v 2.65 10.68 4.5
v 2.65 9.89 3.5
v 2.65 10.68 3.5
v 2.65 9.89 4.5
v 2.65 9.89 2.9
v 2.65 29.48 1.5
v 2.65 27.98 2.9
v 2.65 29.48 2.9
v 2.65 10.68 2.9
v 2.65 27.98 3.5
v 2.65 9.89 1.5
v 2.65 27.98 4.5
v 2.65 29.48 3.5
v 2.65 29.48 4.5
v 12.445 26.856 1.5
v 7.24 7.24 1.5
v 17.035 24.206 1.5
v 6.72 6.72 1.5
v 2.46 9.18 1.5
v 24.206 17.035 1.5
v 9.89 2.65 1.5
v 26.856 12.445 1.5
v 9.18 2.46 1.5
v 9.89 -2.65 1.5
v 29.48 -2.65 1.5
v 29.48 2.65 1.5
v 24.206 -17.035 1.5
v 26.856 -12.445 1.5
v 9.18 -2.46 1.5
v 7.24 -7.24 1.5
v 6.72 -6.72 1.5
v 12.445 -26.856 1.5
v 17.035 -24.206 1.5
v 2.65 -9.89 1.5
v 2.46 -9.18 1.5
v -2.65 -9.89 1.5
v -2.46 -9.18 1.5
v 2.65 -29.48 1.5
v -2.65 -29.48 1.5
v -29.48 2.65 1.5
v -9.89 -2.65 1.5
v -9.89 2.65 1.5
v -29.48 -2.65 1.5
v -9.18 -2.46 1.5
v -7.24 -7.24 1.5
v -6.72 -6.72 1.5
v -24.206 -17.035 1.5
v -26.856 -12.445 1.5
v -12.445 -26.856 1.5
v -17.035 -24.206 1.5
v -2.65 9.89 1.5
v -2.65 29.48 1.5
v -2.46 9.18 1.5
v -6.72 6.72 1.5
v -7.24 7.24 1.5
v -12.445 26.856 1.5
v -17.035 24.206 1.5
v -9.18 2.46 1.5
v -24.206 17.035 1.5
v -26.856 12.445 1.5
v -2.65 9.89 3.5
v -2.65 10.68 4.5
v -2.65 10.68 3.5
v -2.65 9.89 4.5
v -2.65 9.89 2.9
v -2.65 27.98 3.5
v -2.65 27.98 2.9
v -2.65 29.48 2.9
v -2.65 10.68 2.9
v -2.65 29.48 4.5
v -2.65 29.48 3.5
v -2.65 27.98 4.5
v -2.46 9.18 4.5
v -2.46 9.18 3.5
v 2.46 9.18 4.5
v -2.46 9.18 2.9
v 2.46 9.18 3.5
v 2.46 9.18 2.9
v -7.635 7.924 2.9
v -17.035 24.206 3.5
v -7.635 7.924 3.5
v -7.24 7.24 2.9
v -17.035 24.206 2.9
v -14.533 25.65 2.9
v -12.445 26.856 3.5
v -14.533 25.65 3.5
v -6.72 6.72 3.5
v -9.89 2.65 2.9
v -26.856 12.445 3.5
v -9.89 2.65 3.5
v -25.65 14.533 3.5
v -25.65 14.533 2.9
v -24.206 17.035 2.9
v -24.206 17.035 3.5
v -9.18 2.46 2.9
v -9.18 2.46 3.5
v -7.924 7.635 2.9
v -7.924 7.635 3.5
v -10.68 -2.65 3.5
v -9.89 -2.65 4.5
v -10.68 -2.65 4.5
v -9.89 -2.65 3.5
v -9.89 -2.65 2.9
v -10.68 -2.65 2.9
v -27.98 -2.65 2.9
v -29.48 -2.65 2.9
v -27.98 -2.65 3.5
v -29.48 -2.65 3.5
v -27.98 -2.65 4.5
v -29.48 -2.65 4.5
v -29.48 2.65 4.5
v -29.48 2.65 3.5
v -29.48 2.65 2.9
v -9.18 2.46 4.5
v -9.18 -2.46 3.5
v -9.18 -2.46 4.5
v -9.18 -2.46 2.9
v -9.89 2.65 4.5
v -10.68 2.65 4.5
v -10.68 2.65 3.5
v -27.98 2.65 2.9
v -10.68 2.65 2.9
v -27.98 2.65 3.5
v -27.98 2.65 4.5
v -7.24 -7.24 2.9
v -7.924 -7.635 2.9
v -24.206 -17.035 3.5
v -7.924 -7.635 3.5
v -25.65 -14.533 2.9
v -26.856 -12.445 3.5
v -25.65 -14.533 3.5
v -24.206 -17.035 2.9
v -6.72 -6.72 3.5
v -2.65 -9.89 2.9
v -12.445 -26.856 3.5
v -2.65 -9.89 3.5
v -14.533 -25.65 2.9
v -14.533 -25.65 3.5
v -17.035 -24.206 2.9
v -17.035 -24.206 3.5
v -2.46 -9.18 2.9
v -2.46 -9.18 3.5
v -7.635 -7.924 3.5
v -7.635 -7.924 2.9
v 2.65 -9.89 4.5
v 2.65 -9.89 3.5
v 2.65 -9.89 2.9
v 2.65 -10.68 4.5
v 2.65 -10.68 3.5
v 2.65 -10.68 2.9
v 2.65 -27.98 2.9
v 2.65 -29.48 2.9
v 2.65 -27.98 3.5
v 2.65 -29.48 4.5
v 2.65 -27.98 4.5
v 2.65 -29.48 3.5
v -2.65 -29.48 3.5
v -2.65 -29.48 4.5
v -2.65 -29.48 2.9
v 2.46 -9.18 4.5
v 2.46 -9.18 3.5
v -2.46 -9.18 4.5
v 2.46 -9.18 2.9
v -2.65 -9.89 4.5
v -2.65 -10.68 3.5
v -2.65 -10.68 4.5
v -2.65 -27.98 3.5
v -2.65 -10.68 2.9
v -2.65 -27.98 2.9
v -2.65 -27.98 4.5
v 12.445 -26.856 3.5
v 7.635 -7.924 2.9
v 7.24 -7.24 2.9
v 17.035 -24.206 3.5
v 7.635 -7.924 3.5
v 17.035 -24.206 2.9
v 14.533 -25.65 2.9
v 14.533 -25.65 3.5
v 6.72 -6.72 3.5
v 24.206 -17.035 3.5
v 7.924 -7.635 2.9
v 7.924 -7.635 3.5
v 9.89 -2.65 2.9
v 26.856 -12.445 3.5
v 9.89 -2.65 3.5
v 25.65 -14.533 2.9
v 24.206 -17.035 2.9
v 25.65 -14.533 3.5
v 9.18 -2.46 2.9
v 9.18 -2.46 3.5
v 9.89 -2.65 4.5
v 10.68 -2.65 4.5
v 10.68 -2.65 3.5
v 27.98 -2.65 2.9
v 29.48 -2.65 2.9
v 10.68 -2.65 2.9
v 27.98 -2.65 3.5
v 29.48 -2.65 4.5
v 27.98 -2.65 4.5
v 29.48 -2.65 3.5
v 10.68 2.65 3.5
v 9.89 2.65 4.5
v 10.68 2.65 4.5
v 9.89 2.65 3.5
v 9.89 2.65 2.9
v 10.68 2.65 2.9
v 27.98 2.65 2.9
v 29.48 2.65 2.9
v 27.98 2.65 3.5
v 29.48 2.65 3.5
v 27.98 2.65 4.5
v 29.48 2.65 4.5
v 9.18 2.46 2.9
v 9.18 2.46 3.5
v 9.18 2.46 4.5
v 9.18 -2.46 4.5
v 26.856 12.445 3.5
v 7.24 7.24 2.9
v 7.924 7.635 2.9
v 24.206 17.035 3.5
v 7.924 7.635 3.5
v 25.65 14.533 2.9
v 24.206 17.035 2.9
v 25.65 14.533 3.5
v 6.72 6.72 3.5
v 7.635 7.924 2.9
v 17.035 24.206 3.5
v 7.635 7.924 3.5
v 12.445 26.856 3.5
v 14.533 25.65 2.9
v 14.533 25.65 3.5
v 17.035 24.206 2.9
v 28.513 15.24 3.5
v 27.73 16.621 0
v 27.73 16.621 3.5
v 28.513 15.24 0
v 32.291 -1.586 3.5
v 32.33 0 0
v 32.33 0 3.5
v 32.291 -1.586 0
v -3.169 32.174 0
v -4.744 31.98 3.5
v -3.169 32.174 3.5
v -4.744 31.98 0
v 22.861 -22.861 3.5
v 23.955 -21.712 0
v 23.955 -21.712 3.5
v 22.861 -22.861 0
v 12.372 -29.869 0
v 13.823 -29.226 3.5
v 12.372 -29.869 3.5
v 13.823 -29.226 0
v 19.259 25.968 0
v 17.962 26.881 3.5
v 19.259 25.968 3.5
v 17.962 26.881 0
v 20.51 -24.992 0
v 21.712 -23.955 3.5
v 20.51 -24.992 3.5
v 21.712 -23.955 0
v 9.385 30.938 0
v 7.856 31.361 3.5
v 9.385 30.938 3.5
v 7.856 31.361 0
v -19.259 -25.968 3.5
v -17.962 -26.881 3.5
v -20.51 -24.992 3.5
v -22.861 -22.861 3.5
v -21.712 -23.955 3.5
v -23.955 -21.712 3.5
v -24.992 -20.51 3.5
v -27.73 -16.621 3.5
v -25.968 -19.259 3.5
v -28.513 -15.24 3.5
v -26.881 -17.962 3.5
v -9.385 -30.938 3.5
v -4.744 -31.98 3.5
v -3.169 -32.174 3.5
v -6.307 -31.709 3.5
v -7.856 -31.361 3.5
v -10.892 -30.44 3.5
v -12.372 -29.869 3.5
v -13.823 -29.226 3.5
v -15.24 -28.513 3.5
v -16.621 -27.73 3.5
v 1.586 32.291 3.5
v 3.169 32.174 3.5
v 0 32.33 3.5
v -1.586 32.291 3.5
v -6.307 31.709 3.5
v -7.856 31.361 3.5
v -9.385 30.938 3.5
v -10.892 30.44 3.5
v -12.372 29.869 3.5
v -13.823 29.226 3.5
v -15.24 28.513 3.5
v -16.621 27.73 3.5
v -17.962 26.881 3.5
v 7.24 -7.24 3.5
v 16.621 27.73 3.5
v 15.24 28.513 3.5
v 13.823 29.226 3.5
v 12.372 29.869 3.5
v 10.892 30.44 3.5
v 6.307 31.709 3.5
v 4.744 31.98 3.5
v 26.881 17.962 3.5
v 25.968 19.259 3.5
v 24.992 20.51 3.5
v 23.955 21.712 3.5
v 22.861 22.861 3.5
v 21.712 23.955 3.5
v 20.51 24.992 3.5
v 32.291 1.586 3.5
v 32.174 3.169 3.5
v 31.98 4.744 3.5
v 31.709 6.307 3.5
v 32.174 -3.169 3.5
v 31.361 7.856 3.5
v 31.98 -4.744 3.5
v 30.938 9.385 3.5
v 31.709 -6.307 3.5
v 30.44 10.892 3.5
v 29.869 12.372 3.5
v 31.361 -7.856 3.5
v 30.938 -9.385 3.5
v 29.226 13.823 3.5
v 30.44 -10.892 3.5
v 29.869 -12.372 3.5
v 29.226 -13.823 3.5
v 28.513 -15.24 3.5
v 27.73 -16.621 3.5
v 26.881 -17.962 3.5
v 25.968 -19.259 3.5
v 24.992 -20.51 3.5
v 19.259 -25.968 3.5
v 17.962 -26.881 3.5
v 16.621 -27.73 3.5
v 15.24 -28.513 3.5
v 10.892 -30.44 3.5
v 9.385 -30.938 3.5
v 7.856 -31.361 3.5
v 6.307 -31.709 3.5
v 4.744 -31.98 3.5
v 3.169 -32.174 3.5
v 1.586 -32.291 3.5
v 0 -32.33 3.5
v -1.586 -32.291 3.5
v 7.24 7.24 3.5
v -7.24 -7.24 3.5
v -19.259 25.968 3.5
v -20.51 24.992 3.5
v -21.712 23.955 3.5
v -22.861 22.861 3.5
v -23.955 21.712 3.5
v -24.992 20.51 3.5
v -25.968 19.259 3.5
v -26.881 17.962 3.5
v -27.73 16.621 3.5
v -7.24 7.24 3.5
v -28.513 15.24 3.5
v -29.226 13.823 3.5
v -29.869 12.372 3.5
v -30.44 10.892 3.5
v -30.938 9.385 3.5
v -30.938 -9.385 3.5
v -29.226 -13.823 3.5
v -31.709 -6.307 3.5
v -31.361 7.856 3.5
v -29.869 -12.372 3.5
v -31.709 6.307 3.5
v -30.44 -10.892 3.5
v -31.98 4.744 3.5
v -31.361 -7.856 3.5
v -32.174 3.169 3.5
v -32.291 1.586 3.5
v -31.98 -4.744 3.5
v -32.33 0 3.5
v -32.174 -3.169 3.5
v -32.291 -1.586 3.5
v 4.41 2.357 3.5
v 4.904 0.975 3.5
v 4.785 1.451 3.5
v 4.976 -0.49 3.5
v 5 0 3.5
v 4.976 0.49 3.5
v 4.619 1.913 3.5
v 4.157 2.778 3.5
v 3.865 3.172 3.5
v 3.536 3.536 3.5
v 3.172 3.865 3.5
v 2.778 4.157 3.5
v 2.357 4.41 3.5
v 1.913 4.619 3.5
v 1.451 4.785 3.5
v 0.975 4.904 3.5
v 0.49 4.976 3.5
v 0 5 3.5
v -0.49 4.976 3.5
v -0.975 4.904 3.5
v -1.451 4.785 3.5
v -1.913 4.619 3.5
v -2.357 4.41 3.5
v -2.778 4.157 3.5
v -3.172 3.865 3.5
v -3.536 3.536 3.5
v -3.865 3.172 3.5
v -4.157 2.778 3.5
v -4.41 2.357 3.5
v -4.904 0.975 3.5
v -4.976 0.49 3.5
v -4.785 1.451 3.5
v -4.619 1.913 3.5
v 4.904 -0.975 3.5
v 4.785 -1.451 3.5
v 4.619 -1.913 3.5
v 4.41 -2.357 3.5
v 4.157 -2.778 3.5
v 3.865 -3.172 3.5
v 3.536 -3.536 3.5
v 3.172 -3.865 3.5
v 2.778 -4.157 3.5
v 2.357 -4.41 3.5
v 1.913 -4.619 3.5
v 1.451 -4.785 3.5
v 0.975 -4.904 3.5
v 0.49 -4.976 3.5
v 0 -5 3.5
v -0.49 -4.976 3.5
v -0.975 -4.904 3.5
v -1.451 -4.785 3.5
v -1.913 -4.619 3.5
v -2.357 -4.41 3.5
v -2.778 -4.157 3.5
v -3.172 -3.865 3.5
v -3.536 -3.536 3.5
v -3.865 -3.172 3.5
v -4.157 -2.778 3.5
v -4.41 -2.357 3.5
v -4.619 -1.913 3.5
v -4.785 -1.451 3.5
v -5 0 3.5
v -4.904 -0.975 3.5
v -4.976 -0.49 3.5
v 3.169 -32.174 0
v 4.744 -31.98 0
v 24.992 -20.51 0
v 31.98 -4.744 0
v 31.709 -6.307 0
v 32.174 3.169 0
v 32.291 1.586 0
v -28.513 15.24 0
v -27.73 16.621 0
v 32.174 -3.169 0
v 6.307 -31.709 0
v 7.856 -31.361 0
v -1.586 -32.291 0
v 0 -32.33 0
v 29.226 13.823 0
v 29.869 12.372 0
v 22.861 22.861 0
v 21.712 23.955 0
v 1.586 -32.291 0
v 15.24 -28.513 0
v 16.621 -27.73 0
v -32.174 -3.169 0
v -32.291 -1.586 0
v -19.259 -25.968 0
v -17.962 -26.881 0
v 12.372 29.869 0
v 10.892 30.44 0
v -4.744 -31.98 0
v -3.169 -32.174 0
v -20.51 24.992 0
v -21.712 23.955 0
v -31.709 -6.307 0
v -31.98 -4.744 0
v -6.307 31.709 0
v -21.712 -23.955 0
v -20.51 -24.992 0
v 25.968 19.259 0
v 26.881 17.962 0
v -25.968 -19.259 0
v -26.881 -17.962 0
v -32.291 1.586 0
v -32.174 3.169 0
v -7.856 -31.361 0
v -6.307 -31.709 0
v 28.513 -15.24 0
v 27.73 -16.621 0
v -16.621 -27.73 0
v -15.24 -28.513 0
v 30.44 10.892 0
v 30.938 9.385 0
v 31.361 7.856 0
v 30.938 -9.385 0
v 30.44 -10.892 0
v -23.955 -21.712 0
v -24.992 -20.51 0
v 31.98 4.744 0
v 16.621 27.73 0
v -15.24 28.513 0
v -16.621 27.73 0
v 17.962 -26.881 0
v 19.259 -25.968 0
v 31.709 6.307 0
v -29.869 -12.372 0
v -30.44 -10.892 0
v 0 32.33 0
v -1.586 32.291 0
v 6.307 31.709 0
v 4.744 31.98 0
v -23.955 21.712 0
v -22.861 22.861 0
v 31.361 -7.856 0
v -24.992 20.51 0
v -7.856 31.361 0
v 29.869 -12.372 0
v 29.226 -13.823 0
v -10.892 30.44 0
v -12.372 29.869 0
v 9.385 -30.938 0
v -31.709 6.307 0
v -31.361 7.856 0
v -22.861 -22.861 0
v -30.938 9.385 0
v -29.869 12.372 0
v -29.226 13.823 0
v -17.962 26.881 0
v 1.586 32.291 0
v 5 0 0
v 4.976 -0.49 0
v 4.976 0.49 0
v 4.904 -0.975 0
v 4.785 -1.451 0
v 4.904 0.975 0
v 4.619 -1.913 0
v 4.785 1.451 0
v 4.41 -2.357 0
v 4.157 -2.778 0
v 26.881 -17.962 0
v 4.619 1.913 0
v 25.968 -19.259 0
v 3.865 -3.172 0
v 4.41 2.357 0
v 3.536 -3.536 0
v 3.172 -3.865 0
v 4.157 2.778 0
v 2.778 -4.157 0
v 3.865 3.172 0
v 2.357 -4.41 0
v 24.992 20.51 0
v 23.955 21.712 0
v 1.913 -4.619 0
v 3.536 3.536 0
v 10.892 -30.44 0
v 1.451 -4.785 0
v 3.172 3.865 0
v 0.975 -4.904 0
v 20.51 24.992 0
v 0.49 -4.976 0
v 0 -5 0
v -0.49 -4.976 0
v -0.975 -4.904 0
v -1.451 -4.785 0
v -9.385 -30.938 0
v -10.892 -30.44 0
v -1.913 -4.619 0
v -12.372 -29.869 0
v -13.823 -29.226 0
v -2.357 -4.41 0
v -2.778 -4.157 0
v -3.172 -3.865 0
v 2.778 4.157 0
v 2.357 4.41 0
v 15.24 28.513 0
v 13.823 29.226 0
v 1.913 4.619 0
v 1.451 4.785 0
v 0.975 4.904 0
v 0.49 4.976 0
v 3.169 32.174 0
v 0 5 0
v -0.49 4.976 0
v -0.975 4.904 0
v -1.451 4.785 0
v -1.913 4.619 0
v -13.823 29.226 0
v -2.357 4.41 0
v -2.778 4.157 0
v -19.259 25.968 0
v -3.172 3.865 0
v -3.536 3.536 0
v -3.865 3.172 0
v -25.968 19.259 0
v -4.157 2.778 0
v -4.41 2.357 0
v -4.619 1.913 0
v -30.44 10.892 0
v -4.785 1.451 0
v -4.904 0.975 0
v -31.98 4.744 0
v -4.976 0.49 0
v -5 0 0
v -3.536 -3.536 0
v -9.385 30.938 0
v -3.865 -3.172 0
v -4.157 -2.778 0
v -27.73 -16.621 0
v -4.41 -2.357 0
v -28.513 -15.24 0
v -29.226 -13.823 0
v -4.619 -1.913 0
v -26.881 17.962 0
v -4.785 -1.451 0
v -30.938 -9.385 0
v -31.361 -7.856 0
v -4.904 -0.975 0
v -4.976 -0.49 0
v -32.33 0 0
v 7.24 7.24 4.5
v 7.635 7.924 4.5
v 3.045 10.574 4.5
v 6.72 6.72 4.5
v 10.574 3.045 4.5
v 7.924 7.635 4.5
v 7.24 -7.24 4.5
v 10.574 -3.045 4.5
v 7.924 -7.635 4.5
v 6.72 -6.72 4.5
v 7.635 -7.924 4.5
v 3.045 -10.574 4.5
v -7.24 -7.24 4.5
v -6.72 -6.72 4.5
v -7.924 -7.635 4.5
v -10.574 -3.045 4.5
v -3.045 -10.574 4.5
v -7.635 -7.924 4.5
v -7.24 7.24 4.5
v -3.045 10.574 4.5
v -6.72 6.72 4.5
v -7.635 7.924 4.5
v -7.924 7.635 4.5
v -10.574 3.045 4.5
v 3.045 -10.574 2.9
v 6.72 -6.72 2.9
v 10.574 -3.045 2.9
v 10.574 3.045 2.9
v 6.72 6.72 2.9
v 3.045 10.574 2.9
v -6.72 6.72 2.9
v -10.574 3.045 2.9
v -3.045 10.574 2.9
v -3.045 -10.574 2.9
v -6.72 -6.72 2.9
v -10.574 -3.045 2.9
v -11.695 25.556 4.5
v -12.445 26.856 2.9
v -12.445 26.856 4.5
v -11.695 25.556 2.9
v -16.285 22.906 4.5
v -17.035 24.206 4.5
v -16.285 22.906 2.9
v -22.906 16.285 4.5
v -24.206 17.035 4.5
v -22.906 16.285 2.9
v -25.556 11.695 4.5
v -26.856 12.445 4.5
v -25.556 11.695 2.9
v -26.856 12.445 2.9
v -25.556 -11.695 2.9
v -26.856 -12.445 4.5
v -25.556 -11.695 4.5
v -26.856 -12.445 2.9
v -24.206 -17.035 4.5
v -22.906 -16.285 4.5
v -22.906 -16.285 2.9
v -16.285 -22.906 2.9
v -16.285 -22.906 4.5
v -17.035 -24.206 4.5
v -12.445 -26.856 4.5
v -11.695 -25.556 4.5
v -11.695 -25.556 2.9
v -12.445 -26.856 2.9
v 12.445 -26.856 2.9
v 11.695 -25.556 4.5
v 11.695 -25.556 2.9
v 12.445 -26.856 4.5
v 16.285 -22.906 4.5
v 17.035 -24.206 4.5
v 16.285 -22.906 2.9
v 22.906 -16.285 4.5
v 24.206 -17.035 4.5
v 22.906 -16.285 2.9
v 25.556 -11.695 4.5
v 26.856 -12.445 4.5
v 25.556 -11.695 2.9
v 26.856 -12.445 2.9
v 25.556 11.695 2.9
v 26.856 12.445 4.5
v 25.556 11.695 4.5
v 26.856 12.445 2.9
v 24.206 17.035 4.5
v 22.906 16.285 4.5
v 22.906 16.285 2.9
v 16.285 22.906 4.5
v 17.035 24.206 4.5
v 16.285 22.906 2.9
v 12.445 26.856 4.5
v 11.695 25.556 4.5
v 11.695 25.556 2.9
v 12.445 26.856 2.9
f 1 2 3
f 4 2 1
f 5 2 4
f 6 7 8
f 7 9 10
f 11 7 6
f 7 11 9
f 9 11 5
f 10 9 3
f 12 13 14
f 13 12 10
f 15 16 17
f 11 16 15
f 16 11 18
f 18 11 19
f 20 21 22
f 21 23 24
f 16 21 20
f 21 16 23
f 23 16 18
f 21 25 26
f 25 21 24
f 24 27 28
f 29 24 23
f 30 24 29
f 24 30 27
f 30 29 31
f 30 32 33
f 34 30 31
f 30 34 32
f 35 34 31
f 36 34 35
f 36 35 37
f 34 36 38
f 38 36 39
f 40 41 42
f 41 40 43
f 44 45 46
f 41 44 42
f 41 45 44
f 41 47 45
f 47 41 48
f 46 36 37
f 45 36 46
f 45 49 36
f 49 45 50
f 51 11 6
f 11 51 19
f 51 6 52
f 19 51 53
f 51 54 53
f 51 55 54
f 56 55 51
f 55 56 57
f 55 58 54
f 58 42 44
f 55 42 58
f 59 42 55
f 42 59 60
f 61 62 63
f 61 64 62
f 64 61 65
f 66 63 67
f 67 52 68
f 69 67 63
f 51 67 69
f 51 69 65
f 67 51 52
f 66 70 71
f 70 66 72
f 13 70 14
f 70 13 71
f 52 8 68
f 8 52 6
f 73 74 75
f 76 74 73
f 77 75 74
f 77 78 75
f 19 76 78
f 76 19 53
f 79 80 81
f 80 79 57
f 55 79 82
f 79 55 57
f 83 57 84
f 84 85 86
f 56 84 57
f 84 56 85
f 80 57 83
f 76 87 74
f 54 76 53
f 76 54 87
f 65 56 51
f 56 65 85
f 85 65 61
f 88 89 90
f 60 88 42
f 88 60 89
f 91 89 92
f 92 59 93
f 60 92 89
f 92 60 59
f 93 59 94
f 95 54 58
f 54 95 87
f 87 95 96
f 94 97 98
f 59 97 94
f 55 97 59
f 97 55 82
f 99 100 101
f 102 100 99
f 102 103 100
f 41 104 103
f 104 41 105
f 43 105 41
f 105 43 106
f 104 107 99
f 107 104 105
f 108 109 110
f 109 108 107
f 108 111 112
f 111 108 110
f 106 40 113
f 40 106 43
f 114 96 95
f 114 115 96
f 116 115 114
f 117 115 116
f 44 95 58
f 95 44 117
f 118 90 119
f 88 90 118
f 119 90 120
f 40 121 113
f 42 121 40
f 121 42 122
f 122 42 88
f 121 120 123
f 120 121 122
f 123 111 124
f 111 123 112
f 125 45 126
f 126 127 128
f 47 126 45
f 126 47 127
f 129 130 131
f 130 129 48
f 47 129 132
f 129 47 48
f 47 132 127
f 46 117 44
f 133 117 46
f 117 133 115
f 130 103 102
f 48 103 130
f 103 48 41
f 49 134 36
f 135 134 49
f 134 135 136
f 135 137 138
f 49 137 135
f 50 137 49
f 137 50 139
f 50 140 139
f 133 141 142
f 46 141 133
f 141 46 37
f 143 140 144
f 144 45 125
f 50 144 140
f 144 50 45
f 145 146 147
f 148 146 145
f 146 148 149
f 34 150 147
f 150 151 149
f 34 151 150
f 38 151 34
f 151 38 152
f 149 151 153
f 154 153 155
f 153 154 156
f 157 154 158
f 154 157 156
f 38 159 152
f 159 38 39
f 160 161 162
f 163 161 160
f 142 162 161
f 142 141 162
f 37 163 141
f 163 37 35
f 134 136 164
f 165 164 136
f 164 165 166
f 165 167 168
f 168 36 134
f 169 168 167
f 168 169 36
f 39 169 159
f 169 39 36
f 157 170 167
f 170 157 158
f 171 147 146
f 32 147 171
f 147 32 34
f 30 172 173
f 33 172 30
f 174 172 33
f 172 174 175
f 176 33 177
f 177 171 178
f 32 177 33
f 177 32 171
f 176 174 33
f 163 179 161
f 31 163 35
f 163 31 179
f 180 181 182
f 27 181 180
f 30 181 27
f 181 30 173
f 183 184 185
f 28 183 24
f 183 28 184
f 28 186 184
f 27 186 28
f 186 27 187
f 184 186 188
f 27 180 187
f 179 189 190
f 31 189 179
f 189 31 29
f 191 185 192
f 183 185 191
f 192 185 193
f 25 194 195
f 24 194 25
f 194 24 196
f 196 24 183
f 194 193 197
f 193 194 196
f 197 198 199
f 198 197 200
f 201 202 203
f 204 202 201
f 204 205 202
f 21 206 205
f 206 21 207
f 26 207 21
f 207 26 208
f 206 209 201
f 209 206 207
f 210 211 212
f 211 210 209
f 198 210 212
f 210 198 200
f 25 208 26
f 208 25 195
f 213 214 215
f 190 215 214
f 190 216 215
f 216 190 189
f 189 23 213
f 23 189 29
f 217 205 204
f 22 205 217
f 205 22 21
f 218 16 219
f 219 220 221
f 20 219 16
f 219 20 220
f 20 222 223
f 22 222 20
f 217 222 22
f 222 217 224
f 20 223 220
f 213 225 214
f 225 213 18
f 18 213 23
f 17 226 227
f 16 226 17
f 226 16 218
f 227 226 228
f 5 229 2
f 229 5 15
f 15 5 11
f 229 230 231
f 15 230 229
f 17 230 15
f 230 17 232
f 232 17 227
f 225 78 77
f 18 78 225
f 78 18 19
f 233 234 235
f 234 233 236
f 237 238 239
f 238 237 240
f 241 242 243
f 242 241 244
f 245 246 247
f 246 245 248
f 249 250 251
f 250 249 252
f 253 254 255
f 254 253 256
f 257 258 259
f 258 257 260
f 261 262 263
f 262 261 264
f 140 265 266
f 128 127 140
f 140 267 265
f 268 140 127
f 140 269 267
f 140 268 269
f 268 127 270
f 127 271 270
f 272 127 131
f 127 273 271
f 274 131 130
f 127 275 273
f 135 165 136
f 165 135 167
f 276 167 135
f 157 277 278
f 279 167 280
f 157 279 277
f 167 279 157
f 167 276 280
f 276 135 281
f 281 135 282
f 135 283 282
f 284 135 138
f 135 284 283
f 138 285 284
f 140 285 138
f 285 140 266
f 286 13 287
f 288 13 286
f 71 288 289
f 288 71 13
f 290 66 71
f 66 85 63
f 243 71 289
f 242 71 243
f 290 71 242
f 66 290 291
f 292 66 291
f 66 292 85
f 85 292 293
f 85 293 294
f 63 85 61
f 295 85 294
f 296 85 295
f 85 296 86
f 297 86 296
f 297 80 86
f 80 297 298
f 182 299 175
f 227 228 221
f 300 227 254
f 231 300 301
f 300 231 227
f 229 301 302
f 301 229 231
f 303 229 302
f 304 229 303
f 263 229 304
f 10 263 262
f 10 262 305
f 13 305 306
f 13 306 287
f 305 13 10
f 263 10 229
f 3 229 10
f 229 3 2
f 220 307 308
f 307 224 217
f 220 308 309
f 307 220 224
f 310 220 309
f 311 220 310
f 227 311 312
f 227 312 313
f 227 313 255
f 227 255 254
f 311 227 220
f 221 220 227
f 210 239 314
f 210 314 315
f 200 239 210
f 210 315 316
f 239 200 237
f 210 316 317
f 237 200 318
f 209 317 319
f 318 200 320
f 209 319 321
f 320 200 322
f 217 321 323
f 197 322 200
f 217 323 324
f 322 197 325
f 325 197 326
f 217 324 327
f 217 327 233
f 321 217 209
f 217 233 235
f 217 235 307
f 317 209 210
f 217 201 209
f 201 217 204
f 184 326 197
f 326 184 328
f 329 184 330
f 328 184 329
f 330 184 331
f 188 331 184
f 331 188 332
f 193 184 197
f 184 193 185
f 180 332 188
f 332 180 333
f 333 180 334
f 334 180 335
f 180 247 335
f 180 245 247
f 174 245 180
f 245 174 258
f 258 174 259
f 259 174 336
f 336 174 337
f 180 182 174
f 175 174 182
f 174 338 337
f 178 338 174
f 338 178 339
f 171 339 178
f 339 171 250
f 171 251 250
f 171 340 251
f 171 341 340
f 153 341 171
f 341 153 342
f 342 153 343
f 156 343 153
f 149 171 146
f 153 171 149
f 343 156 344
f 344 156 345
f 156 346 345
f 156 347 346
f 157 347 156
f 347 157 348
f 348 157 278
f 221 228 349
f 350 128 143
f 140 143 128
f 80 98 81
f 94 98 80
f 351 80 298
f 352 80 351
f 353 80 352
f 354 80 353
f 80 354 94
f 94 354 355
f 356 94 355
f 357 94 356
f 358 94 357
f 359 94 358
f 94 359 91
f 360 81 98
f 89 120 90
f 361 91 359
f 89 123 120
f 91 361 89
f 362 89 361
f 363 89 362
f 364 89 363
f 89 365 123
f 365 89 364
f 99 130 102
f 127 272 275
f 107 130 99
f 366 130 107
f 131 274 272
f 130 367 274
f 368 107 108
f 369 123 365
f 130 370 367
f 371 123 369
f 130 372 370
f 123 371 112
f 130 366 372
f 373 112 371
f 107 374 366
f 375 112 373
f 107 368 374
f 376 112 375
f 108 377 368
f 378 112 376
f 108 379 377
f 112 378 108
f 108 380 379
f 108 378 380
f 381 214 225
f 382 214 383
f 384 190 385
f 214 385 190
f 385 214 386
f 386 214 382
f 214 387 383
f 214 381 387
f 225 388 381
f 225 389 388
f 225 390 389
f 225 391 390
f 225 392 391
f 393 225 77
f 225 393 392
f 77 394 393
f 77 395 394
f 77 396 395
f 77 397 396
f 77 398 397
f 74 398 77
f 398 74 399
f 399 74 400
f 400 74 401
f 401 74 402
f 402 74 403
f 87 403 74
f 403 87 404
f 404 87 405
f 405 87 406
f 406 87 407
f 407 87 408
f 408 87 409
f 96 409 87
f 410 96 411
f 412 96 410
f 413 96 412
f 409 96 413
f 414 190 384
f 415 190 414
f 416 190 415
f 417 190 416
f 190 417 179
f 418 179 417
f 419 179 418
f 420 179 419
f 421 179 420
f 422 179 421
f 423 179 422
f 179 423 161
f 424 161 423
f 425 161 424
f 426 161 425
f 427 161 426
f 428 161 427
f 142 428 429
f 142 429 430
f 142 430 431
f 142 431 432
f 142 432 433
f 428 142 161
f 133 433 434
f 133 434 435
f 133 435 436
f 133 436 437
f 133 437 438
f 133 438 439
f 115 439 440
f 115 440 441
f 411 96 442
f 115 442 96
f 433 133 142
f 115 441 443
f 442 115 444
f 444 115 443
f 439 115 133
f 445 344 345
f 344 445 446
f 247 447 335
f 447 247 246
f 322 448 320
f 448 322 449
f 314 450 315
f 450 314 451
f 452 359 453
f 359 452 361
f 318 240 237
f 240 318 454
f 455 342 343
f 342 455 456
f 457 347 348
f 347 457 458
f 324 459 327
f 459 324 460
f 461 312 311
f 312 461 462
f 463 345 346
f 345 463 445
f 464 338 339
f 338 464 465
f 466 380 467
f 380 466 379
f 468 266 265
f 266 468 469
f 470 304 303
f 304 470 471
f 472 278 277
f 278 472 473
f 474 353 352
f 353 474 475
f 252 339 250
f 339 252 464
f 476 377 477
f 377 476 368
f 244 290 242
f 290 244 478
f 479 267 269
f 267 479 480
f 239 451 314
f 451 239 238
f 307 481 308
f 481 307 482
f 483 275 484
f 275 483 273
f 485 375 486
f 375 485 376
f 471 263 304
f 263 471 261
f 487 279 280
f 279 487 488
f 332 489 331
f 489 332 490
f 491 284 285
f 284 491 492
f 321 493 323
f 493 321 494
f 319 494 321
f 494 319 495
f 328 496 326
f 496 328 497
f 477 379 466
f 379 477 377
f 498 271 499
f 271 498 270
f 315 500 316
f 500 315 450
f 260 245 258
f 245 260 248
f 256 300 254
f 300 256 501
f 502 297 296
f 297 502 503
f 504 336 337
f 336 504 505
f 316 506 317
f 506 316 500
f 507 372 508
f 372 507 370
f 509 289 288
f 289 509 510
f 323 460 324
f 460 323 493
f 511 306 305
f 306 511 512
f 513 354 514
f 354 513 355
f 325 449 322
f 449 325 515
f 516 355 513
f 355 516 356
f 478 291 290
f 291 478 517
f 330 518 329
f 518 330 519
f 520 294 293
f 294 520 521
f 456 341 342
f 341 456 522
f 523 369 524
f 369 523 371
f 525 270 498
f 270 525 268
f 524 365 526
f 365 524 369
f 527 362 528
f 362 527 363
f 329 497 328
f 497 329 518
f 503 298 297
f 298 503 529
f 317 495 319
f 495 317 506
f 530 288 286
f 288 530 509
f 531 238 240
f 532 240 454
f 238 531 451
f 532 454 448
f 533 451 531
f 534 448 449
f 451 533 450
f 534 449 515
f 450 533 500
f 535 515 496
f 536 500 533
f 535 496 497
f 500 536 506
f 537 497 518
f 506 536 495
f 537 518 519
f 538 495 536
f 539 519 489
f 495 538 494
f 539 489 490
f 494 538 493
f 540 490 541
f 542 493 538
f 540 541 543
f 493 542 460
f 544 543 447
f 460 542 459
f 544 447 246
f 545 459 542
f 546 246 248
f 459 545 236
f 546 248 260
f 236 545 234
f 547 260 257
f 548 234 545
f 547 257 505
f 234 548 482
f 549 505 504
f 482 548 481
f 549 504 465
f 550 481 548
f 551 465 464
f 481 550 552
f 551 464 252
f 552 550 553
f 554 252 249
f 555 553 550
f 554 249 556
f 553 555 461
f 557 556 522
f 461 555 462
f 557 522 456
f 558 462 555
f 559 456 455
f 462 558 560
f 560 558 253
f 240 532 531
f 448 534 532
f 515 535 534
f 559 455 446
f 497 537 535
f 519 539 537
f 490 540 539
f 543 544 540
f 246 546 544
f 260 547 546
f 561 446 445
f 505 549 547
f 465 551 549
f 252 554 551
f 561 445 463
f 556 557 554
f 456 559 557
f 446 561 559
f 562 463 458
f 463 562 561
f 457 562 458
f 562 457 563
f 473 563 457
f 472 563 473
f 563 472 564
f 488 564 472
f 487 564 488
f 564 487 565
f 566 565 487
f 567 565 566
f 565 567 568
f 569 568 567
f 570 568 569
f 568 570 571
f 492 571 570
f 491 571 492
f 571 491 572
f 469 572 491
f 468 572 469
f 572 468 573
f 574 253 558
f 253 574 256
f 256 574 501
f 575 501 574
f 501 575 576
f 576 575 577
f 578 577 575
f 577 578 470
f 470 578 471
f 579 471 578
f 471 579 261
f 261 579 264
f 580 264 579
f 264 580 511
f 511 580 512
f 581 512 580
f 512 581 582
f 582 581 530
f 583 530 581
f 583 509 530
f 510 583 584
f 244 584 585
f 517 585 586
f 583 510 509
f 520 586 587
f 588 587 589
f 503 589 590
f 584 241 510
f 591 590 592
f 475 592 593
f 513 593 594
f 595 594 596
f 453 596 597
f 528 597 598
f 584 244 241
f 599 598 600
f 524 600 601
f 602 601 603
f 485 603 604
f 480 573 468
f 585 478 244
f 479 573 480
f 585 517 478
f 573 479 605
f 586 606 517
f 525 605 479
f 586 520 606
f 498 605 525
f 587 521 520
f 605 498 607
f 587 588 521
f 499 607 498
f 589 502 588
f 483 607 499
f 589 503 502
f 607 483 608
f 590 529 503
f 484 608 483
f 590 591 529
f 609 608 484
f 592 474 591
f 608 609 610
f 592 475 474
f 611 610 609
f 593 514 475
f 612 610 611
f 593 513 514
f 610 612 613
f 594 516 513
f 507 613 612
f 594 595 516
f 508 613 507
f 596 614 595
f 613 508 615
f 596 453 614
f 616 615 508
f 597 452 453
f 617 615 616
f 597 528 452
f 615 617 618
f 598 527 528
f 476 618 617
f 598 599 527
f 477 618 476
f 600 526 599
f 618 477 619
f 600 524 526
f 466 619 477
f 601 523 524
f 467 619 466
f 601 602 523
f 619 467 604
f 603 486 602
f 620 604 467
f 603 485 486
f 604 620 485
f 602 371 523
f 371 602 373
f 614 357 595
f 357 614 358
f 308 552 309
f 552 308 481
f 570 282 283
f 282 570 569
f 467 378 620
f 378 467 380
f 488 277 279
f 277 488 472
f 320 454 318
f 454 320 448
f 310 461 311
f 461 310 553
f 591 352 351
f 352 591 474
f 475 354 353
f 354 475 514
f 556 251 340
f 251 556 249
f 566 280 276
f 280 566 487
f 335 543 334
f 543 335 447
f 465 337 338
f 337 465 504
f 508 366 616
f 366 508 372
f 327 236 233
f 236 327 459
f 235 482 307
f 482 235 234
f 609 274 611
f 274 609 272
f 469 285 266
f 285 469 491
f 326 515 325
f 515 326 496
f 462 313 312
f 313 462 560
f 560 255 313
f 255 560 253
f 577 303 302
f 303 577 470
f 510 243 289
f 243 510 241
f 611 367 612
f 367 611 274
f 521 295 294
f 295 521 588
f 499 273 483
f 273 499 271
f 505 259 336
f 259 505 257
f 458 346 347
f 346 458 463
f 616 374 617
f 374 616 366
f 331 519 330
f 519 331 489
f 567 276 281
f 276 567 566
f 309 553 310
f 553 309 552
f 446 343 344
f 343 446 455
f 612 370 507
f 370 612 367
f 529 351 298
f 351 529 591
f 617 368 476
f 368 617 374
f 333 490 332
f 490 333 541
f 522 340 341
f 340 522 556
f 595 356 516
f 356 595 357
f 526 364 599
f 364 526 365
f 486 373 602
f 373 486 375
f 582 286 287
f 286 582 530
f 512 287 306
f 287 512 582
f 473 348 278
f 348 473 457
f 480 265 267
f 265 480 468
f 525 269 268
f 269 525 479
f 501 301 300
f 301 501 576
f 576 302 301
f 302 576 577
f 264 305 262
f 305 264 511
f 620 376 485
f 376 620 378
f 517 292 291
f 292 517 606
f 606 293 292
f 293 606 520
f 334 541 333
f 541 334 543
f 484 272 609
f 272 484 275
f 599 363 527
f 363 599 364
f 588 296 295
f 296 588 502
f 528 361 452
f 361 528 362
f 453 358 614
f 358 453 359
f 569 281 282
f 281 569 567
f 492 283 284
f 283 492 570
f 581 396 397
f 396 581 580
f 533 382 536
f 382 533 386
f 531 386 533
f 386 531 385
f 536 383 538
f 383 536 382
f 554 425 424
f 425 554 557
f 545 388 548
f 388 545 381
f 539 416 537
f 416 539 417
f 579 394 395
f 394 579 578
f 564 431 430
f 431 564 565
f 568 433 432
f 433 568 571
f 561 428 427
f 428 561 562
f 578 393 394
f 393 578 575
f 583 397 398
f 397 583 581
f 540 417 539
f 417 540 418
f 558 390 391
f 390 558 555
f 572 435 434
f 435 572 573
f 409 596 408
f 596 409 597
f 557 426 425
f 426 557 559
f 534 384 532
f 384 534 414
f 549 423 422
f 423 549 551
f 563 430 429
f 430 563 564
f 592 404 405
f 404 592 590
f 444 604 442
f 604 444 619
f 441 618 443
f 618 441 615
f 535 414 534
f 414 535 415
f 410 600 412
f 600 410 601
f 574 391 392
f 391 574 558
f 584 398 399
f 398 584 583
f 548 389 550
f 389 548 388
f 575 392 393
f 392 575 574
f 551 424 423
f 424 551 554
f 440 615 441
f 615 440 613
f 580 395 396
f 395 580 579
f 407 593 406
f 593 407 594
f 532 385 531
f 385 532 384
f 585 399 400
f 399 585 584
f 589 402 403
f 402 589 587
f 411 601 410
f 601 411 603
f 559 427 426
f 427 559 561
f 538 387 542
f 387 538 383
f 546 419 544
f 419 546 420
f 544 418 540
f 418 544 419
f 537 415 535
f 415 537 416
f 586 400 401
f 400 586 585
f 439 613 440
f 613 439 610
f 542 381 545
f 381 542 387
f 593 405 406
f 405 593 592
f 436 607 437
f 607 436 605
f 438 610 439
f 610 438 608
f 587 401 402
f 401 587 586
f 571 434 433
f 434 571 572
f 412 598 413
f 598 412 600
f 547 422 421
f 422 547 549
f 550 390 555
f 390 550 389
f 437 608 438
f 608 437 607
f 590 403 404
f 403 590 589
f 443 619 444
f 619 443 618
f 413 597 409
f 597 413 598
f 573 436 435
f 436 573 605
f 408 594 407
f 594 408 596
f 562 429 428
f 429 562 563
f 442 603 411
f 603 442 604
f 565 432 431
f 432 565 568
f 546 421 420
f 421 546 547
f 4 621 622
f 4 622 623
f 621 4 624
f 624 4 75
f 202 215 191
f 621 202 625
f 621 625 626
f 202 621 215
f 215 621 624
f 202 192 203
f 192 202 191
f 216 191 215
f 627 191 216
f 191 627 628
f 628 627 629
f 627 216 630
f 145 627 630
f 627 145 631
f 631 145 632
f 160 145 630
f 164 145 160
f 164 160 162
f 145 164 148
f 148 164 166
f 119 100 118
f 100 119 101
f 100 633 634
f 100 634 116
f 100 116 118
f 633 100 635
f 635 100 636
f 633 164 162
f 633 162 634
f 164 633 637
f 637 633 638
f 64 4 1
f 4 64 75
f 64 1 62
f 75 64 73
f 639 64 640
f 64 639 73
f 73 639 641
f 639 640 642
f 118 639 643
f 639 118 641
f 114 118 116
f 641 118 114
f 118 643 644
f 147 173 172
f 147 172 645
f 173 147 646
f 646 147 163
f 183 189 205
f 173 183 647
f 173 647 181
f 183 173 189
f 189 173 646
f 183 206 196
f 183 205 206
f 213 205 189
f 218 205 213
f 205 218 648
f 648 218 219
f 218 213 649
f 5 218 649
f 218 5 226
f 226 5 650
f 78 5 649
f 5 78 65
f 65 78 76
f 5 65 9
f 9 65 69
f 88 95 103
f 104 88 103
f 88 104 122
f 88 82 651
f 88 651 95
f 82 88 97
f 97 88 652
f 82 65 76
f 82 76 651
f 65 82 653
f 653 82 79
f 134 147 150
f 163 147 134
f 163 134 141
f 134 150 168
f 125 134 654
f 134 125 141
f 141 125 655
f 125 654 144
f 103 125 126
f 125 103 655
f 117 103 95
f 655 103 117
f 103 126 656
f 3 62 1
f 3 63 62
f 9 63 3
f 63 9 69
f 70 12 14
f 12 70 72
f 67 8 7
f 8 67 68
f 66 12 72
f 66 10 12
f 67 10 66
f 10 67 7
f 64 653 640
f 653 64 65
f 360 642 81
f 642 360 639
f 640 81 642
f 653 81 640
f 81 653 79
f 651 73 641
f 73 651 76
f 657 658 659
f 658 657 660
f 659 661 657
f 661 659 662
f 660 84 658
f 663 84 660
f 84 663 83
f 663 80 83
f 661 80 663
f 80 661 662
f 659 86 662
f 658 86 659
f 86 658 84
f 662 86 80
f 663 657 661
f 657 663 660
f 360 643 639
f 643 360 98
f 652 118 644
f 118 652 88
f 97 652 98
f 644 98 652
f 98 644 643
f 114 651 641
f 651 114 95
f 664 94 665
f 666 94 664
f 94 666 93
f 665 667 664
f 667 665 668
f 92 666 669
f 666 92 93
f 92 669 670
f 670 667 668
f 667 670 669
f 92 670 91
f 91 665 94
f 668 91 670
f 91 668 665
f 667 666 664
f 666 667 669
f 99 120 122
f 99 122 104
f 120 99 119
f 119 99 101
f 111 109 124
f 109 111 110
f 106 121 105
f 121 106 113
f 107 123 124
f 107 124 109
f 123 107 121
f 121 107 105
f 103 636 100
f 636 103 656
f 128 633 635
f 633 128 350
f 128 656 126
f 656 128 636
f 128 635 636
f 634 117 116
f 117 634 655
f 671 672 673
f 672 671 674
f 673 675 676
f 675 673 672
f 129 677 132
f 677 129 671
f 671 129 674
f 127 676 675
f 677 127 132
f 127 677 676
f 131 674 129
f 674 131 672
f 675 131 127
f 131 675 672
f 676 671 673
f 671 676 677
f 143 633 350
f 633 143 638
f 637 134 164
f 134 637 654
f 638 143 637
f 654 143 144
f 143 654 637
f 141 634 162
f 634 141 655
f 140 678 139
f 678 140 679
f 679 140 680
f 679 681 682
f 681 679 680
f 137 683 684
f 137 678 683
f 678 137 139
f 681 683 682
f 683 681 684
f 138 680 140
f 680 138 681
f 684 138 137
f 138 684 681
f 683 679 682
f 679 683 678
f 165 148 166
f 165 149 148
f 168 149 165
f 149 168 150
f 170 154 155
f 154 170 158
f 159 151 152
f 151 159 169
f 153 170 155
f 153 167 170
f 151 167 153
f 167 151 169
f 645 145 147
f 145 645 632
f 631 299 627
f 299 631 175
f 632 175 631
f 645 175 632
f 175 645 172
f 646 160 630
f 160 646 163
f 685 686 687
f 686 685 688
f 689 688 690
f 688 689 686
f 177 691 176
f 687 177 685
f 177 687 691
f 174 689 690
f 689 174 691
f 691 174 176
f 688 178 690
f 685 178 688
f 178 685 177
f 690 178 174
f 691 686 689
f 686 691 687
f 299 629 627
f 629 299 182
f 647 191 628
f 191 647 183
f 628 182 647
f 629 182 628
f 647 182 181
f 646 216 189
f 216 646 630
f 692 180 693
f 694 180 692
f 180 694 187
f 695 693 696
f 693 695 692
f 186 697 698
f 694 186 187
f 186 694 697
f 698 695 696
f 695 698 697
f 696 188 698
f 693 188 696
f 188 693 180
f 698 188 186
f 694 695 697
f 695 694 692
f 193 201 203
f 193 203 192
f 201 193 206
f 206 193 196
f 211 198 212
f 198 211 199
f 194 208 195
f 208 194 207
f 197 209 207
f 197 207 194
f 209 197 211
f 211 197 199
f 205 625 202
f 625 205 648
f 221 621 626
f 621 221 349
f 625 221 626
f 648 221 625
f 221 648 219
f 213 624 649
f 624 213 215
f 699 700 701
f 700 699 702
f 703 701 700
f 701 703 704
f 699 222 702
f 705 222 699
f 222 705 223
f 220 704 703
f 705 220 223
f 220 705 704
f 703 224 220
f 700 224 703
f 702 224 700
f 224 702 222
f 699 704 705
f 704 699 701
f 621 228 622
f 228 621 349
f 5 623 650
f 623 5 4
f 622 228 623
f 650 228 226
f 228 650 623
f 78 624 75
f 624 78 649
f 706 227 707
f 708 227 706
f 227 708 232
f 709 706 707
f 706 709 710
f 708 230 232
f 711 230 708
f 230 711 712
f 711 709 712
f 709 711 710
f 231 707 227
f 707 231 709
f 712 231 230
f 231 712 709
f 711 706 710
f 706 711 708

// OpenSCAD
// =============================================================================
//  Encoder Wheel Frame
//  Generated by generate_3d.py — do not edit by hand; re-run the script.
// =============================================================================
//
//  Render with F6 in OpenSCAD, then File → Export → STL.
//  Requires OpenSCAD 2021.01 or later.
//
//  Coordinate system
//  -----------------
//    Z = wheel axis (print flat on Z = 0 plane)
//    XY = wheel face
//

// ---- Geometry parameters ----------------------------------------
n_magnets       = 12;       // number of magnets
angle_step      = 30.000000; // degrees between magnets
magnet_length   = 20.0;    // radial length (mm)
magnet_width    = 5.0;     // tangential width (mm)
magnet_thick    = 2.0;     // axial thickness (mm)
r_inner         = 9.3301;  // inner radius (mm)
r_outer         = 29.3301;  // outer radius (mm)
r_frame         = 32.3301;  // frame outer radius (mm)
center_bore     = 5.0;     // shaft bore radius (mm)
clearance       = 0.15;    // per-side pocket clearance (mm)

// ---- Pocket dimensions ----------------------------------------
pw              = 5.3;   // pocket width  (tangential)
pl              = 20.3;   // pocket length (radial)
pd              = 2.0;       // pocket depth  (axial)
r_pkt           = 9.1801;  // pocket inner-edge radius

back_thickness  = 1.5;    // back plate thickness (mm)
tab_width       = 1.5;    // retaining tab radial width (mm)
tab_overhang    = 0.6;    // retaining tab overhang (mm)

z_back          = 1.5;    // Z of pocket floor
z_top_magnet    = 3.500;  // Z of pocket opening / magnet top
total_height    = 3.500;  // overall frame height

// ====================================================================
// Module: magnet_pocket()
// One magnet slot, open at the top face (+Z).
// In local coords: +Y = radial outward, +X = tangential CCW, +Z = axial.
// The pocket inner edge sits at r_pkt (slightly inside r_inner).
// ====================================================================
module magnet_pocket() {
    translate([-pw/2, 9.1801, 1.500])
        cube([pw, pl, pd + 1]);  // +1 ensures clean exit through top face
}

// ====================================================================
// Module: retaining_tabs()
// Two small lips at the inner and outer radial ends of the pocket
// opening.  They overhang the pocket so magnets snap in from above.
// Print with the pocket face upward so these bridge the gap.
// ====================================================================
module retaining_tabs() {
    // Inner-radial tab
    translate([-pw/2, 9.1801, 2.9000])
        cube([pw, 1.5, 1.6]);  // +1 = above face
    // Outer-radial tab
    translate([-pw/2, 27.9801, 2.9000])
        cube([pw, 1.5, 1.6]);
}

// ====================================================================
// Module: encoder_wheel()
// Complete encoder wheel frame — subtract pockets then optionally add
// tabs, front face, and/or steel clip slots.
// ====================================================================
module encoder_wheel() {
    union() {

        // -- Main body: outer ring + (optional) back disc --
        difference() {

            // Solid disc from z=0 to z=total_height
            cylinder(h = 3.500, r = r_frame, $fn = 128);

            // Central shaft bore
            cylinder(h = 3.500 * 3, r = center_bore, center = true, $fn = 64);


            // Magnet pockets
            for (i = [0 : n_magnets - 1]) {
                rotate([0, 0, i * angle_step])
                    magnet_pocket();
            }

        }  // end difference

        // -- Retaining tabs (overhang over pocket openings) --
        for (i = [0 : n_magnets - 1]) {
            rotate([0, 0, i * angle_step])
                retaining_tabs();
        }

    }  // end union
}  // end encoder_wheel

// ====================================================================
// Render the wheel
// ====================================================================
encoder_wheel();
